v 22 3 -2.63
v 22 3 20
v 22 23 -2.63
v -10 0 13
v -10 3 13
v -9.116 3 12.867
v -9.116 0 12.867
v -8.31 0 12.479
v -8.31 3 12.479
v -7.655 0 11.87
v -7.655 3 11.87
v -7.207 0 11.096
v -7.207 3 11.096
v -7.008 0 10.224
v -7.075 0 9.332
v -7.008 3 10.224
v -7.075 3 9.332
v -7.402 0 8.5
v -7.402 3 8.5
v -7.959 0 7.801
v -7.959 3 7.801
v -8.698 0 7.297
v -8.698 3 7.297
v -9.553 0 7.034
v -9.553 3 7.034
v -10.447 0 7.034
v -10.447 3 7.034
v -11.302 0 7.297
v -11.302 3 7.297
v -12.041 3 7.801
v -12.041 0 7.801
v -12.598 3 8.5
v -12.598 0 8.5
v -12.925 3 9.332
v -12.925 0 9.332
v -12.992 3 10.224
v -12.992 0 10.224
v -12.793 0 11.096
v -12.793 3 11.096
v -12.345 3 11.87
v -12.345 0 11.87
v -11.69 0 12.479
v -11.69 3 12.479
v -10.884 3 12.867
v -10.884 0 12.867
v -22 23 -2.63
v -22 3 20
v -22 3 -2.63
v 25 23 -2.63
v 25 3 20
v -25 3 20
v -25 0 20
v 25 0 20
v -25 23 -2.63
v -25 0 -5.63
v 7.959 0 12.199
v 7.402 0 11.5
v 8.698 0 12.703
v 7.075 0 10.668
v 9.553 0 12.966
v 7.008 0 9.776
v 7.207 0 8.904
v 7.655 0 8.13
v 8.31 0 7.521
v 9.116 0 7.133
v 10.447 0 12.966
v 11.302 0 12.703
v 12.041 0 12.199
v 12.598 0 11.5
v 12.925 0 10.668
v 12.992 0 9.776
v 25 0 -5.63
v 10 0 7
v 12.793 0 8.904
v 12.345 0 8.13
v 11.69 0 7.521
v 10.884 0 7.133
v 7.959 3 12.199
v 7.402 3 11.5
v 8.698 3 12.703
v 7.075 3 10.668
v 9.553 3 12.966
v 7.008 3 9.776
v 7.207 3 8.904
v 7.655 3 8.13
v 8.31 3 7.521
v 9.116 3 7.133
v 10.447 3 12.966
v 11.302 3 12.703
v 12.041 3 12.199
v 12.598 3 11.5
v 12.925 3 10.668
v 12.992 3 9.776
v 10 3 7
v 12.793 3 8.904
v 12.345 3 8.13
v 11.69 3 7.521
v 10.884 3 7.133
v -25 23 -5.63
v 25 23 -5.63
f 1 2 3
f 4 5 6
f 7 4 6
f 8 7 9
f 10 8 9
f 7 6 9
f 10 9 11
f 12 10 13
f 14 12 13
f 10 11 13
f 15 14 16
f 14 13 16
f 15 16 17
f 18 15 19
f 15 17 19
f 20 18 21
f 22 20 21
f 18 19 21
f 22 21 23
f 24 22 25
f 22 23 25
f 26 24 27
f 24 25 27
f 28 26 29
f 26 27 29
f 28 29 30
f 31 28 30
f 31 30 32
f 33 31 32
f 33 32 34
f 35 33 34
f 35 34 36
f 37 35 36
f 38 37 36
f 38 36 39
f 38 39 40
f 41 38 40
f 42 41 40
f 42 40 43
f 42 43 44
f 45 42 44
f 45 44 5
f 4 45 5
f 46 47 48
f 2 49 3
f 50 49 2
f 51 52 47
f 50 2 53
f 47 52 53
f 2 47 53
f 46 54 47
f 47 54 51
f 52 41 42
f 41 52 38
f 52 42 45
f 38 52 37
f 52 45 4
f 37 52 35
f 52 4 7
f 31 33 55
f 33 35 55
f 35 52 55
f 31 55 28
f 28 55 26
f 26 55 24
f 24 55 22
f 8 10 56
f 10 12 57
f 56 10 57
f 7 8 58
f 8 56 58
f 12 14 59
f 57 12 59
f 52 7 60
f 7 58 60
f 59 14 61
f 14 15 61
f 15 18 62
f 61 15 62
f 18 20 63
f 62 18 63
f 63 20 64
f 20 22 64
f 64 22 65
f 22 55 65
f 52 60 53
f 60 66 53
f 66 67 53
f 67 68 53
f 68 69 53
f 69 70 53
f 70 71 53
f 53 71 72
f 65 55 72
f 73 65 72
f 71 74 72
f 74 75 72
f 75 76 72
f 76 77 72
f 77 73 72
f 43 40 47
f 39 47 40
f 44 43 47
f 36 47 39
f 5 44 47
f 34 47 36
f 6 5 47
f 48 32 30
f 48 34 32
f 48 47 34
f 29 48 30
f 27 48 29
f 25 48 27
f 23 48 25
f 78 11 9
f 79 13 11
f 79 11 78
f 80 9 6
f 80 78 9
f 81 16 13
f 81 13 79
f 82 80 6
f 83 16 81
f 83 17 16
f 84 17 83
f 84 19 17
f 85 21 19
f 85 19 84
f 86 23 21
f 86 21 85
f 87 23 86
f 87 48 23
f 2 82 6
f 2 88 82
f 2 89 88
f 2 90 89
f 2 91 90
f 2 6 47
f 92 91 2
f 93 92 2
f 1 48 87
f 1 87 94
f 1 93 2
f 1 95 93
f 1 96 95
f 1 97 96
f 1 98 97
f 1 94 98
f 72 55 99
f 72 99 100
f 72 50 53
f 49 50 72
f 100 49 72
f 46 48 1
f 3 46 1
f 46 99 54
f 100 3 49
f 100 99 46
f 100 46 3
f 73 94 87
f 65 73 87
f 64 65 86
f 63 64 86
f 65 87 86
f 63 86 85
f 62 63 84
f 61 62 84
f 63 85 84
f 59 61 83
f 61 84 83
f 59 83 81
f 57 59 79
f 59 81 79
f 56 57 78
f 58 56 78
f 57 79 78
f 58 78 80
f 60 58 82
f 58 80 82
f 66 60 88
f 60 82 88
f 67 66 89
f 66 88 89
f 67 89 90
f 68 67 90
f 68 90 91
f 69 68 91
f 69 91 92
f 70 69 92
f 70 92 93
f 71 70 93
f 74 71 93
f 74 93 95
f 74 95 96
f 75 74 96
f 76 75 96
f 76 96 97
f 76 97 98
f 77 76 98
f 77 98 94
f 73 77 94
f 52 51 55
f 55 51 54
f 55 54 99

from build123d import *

# Parameters (mm, degrees)
SKETCH_1_W          = 50
SKETCH_1_H          = 25.63
EXTRUDE_1_DEPTH     = 3
SKETCH_2_W          = 50
SKETCH_2_H          = 3
EXTRUDE_2_DEPTH     = 20
EXTRUDE_3_DEPTH     = 3
SKETCH_7_R          = 3
CUT_EXTRUDE_2_DEPTH = 38.749172176


with BuildPart() as part:
    # 草圖1 → 填料-伸長1 (new body)
    with BuildSketch(Plane(origin=(0, 0, 0), x_dir=(1, 0, 0), z_dir=(0, 1, 0))):
        with Locations((0, -7.185)):
            Rectangle(SKETCH_1_W, SKETCH_1_H)
    extrude(amount=EXTRUDE_1_DEPTH)

    # 草圖2 → 填料-伸長2 (add)
    with BuildSketch(Plane(origin=(0, 3, 0), x_dir=(1, 0, 0), z_dir=(0, 1, 0))):
        with Locations((0, 4.13)):
            Rectangle(SKETCH_2_W, SKETCH_2_H)
    extrude(amount=EXTRUDE_2_DEPTH)

    # 草圖6 → 填料-伸長3 (add)
    with BuildSketch(Plane.ZY.offset(25)):
        Polygon((-2.63, 23), (20, 3), (-2.63, 3), align=None)
    extrude_3 = extrude(amount=-EXTRUDE_3_DEPTH)

    # 鏡射1: 填料-伸長3 across plane
    add(extrude_3.mirror(Plane(origin=(0, 0, 0), x_dir=(0, 0, 1), z_dir=(1, 0, 0))))

    # 草圖7 → 除料-伸長2 (cut, through all)
    with BuildSketch(Plane(origin=(0, 3, 0), x_dir=(1, 0, 0), z_dir=(0, 1, 0))):
        with Locations(Location((-10, -10, 0), (0, 0, 270))):
            Circle(SKETCH_7_R)
        with Locations(Location((10, -10, 0), (0, 0, 90))):
            Circle(SKETCH_7_R)
    extrude(amount=-CUT_EXTRUDE_2_DEPTH, mode=Mode.SUBTRACT)


solid = part.part
